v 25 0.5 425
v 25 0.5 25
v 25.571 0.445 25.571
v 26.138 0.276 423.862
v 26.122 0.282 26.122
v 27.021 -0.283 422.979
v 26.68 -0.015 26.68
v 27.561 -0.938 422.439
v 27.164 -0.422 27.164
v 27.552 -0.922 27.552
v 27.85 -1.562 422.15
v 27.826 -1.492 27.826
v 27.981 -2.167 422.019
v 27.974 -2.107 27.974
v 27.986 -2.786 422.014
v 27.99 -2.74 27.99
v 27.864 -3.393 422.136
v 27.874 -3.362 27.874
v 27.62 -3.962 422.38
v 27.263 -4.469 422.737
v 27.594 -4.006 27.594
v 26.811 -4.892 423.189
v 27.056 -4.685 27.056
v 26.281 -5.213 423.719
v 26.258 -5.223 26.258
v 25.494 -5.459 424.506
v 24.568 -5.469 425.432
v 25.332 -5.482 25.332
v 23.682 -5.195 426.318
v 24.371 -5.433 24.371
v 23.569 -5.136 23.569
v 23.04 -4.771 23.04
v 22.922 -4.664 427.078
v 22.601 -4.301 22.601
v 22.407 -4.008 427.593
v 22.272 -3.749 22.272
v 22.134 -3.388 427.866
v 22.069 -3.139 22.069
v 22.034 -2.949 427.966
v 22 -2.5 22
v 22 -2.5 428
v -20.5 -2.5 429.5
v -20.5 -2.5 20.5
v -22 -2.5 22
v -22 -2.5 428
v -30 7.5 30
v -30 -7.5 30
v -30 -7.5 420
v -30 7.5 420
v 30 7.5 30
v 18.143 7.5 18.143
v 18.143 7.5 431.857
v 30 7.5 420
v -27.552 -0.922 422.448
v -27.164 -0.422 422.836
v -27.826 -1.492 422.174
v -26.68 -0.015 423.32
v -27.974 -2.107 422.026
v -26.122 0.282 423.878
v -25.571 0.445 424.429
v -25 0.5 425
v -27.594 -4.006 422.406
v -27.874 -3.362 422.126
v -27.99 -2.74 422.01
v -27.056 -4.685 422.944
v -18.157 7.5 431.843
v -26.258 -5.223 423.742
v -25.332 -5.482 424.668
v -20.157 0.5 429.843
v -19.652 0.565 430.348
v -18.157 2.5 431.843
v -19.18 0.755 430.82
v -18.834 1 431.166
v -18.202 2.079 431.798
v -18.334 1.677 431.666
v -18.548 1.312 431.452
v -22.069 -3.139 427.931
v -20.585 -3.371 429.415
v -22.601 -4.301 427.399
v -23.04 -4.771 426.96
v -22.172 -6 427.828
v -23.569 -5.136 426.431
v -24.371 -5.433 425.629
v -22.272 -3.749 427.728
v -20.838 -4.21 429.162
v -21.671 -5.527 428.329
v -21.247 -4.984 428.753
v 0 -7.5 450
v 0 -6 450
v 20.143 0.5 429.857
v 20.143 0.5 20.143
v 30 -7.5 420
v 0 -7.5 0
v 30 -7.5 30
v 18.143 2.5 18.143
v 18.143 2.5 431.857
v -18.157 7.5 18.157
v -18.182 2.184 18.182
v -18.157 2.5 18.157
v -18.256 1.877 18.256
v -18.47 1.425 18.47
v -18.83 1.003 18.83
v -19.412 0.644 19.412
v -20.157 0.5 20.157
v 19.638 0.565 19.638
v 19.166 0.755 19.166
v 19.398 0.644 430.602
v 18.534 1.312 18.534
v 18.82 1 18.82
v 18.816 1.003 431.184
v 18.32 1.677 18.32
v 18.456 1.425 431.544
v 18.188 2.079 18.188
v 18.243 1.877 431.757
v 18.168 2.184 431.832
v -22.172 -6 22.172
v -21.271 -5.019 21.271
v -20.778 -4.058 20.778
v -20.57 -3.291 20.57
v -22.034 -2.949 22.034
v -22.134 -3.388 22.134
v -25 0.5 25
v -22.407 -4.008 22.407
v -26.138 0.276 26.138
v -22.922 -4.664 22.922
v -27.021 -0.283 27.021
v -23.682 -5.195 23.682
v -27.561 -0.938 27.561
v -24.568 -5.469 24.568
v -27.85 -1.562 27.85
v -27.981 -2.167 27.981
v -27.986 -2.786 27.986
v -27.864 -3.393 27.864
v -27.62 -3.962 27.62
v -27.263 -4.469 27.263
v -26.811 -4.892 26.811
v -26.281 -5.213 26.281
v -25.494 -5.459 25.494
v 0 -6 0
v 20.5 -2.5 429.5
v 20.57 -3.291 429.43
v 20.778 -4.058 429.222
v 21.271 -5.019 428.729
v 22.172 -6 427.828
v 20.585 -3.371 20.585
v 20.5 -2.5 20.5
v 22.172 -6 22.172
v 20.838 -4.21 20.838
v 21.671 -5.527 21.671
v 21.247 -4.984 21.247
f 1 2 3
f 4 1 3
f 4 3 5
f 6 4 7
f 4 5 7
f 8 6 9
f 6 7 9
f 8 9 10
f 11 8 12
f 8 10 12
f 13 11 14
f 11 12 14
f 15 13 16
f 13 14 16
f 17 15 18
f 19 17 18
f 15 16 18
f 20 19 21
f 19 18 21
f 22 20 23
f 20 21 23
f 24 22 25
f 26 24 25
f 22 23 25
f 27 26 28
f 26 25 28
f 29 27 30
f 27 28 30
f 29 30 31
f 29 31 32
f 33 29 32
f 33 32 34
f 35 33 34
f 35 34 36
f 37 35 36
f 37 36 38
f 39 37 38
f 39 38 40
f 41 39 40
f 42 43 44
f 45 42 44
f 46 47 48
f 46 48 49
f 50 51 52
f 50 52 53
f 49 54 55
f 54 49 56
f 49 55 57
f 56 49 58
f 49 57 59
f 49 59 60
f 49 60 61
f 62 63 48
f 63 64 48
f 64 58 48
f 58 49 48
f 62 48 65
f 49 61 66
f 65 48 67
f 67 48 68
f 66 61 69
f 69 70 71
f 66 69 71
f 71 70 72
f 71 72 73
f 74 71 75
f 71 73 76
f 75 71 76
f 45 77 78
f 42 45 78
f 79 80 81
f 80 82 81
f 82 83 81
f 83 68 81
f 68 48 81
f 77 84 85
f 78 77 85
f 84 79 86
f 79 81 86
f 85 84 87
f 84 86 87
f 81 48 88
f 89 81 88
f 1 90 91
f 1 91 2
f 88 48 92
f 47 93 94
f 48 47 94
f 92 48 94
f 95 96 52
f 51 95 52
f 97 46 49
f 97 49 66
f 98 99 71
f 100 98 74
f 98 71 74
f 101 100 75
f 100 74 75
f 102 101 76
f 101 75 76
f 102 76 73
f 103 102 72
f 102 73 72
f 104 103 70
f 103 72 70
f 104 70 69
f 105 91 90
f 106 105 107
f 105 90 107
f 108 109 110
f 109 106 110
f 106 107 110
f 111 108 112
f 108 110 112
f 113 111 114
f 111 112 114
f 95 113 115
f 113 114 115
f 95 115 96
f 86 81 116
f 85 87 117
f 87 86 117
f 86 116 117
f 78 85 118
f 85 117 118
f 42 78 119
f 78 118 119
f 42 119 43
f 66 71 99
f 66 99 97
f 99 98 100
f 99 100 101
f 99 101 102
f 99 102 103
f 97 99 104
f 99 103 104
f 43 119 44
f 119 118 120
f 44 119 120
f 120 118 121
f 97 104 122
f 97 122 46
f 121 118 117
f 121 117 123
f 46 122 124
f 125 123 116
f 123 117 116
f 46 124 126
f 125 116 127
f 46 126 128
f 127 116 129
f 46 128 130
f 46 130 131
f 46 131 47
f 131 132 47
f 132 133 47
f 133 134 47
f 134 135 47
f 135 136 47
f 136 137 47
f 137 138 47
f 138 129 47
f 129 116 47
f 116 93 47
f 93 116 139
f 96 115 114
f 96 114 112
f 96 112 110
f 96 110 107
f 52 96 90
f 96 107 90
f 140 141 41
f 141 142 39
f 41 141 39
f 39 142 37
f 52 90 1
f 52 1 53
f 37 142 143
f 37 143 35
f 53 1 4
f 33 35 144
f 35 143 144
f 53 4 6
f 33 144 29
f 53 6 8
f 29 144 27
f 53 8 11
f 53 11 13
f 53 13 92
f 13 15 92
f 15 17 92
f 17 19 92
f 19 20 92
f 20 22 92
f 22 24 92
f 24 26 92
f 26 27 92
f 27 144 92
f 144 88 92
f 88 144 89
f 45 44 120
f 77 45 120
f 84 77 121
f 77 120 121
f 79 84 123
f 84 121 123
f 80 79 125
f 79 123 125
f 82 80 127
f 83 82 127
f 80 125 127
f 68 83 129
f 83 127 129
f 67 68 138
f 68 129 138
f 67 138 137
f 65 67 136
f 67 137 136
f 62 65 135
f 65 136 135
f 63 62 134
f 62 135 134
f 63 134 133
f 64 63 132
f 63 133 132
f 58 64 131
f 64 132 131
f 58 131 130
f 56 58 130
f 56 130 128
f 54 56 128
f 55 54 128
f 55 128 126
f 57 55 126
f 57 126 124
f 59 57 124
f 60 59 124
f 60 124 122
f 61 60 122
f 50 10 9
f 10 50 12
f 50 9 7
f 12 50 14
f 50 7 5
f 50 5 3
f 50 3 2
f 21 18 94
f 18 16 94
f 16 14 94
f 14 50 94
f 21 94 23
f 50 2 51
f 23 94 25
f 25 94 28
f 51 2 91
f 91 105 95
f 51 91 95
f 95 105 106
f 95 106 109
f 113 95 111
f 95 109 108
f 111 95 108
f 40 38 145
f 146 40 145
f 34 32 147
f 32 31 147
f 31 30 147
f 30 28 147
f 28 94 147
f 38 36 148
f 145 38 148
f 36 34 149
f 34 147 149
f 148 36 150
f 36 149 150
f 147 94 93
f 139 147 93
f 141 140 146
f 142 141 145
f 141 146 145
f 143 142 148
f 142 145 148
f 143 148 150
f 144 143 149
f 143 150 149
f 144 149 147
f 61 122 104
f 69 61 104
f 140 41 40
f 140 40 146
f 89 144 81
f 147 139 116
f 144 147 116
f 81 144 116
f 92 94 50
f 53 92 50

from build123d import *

# Parameters (mm, degrees)
SKETCH_1_W          = 60
SKETCH_1_H          = 15
EXTRUDE_1_DEPTH     = 450
SKETCH_2_R          = 3
CUT_EXTRUDE_1_DEPTH = 452.061248613
CUT_EXTRUDE_2_DEPTH = 452.061248613
SKETCH_4_W          = 36.3
SKETCH_4_H          = 7
CUT_EXTRUDE_3_DEPTH = 452.061248613
FILLET_1_R          = 2
CUT_EXTRUDE_4_DEPTH = 452.248268695


with BuildPart() as part:
    # 스케치1 → 보스-돌출1 (new body)
    with BuildSketch(Plane.XY):
        Rectangle(SKETCH_1_W, SKETCH_1_H)
    extrude(amount=EXTRUDE_1_DEPTH)

    # 스케치2 → 컷-돌출1 (cut, through all)
    with BuildSketch(Plane(origin=(0, 0, 0), x_dir=(-1, 0, 0), z_dir=(0, 0, -1))):
        with Locations((-25, -2.5)):
            Circle(SKETCH_2_R)
        with Locations((25, -2.5)):
            Circle(SKETCH_2_R)
    extrude(amount=-CUT_EXTRUDE_1_DEPTH, mode=Mode.SUBTRACT)

    # 스케치3 → 컷-돌출2 (cut, through all)
    with BuildSketch(Plane(origin=(0, 0, 0), x_dir=(-1, 0, 0), z_dir=(0, 0, -1))):
        with BuildLine():
            Line((-22.171572875, -6), (22.171572875, -6))
            ThreePointArc((22.171572875, -6), (20.939339828, -4.439339828), (20.5, -2.5))
            Line((20.5, -2.5), (25, -2.5))
            Line((25, -2.5), (25, 0.5))
            Line((25, 0.5), (-25, 0.5))
            Line((-25, 0.5), (-25, -2.5))
            Line((-25, -2.5), (-20.5, -2.5))
            ThreePointArc((-20.5, -2.5), (-20.939339828, -4.439339828), (-22.171572875, -6))
        make_face()
    extrude(amount=-CUT_EXTRUDE_2_DEPTH, mode=Mode.SUBTRACT)

    # 스케치4 → 컷-돌출3 (cut, through all)
    with BuildSketch(Plane(origin=(0, 0, 0), x_dir=(-1, 0, 0), z_dir=(0, 0, -1))):
        with Locations((0.006888359, 4)):
            Rectangle(SKETCH_4_W, SKETCH_4_H)
    extrude(amount=-CUT_EXTRUDE_3_DEPTH, mode=Mode.SUBTRACT)

    # 필렛1
    fillet_1_edges = [part.edges().sort_by_distance(p)[0] for p in [
        (-18.156888359, 0.5, 225),
        (18.143111641, 0.5, 225),
    ]]
    fillet(fillet_1_edges, radius=FILLET_1_R)

    # 스케치5 → 컷-돌출4 (cut, through all)
    with BuildSketch(Plane.XZ.offset(7.5)):
        Polygon((30, 450), (0, 450), (30, 420), align=None)
        Polygon((0, 450), (-30, 450), (-30, 420), align=None)
        Polygon((0, 0), (-30, 30), (-30, 0), align=None)
        Polygon((30, 30), (0, 0), (30, 0), align=None)
    extrude(amount=-CUT_EXTRUDE_4_DEPTH, mode=Mode.SUBTRACT)


solid = part.part
